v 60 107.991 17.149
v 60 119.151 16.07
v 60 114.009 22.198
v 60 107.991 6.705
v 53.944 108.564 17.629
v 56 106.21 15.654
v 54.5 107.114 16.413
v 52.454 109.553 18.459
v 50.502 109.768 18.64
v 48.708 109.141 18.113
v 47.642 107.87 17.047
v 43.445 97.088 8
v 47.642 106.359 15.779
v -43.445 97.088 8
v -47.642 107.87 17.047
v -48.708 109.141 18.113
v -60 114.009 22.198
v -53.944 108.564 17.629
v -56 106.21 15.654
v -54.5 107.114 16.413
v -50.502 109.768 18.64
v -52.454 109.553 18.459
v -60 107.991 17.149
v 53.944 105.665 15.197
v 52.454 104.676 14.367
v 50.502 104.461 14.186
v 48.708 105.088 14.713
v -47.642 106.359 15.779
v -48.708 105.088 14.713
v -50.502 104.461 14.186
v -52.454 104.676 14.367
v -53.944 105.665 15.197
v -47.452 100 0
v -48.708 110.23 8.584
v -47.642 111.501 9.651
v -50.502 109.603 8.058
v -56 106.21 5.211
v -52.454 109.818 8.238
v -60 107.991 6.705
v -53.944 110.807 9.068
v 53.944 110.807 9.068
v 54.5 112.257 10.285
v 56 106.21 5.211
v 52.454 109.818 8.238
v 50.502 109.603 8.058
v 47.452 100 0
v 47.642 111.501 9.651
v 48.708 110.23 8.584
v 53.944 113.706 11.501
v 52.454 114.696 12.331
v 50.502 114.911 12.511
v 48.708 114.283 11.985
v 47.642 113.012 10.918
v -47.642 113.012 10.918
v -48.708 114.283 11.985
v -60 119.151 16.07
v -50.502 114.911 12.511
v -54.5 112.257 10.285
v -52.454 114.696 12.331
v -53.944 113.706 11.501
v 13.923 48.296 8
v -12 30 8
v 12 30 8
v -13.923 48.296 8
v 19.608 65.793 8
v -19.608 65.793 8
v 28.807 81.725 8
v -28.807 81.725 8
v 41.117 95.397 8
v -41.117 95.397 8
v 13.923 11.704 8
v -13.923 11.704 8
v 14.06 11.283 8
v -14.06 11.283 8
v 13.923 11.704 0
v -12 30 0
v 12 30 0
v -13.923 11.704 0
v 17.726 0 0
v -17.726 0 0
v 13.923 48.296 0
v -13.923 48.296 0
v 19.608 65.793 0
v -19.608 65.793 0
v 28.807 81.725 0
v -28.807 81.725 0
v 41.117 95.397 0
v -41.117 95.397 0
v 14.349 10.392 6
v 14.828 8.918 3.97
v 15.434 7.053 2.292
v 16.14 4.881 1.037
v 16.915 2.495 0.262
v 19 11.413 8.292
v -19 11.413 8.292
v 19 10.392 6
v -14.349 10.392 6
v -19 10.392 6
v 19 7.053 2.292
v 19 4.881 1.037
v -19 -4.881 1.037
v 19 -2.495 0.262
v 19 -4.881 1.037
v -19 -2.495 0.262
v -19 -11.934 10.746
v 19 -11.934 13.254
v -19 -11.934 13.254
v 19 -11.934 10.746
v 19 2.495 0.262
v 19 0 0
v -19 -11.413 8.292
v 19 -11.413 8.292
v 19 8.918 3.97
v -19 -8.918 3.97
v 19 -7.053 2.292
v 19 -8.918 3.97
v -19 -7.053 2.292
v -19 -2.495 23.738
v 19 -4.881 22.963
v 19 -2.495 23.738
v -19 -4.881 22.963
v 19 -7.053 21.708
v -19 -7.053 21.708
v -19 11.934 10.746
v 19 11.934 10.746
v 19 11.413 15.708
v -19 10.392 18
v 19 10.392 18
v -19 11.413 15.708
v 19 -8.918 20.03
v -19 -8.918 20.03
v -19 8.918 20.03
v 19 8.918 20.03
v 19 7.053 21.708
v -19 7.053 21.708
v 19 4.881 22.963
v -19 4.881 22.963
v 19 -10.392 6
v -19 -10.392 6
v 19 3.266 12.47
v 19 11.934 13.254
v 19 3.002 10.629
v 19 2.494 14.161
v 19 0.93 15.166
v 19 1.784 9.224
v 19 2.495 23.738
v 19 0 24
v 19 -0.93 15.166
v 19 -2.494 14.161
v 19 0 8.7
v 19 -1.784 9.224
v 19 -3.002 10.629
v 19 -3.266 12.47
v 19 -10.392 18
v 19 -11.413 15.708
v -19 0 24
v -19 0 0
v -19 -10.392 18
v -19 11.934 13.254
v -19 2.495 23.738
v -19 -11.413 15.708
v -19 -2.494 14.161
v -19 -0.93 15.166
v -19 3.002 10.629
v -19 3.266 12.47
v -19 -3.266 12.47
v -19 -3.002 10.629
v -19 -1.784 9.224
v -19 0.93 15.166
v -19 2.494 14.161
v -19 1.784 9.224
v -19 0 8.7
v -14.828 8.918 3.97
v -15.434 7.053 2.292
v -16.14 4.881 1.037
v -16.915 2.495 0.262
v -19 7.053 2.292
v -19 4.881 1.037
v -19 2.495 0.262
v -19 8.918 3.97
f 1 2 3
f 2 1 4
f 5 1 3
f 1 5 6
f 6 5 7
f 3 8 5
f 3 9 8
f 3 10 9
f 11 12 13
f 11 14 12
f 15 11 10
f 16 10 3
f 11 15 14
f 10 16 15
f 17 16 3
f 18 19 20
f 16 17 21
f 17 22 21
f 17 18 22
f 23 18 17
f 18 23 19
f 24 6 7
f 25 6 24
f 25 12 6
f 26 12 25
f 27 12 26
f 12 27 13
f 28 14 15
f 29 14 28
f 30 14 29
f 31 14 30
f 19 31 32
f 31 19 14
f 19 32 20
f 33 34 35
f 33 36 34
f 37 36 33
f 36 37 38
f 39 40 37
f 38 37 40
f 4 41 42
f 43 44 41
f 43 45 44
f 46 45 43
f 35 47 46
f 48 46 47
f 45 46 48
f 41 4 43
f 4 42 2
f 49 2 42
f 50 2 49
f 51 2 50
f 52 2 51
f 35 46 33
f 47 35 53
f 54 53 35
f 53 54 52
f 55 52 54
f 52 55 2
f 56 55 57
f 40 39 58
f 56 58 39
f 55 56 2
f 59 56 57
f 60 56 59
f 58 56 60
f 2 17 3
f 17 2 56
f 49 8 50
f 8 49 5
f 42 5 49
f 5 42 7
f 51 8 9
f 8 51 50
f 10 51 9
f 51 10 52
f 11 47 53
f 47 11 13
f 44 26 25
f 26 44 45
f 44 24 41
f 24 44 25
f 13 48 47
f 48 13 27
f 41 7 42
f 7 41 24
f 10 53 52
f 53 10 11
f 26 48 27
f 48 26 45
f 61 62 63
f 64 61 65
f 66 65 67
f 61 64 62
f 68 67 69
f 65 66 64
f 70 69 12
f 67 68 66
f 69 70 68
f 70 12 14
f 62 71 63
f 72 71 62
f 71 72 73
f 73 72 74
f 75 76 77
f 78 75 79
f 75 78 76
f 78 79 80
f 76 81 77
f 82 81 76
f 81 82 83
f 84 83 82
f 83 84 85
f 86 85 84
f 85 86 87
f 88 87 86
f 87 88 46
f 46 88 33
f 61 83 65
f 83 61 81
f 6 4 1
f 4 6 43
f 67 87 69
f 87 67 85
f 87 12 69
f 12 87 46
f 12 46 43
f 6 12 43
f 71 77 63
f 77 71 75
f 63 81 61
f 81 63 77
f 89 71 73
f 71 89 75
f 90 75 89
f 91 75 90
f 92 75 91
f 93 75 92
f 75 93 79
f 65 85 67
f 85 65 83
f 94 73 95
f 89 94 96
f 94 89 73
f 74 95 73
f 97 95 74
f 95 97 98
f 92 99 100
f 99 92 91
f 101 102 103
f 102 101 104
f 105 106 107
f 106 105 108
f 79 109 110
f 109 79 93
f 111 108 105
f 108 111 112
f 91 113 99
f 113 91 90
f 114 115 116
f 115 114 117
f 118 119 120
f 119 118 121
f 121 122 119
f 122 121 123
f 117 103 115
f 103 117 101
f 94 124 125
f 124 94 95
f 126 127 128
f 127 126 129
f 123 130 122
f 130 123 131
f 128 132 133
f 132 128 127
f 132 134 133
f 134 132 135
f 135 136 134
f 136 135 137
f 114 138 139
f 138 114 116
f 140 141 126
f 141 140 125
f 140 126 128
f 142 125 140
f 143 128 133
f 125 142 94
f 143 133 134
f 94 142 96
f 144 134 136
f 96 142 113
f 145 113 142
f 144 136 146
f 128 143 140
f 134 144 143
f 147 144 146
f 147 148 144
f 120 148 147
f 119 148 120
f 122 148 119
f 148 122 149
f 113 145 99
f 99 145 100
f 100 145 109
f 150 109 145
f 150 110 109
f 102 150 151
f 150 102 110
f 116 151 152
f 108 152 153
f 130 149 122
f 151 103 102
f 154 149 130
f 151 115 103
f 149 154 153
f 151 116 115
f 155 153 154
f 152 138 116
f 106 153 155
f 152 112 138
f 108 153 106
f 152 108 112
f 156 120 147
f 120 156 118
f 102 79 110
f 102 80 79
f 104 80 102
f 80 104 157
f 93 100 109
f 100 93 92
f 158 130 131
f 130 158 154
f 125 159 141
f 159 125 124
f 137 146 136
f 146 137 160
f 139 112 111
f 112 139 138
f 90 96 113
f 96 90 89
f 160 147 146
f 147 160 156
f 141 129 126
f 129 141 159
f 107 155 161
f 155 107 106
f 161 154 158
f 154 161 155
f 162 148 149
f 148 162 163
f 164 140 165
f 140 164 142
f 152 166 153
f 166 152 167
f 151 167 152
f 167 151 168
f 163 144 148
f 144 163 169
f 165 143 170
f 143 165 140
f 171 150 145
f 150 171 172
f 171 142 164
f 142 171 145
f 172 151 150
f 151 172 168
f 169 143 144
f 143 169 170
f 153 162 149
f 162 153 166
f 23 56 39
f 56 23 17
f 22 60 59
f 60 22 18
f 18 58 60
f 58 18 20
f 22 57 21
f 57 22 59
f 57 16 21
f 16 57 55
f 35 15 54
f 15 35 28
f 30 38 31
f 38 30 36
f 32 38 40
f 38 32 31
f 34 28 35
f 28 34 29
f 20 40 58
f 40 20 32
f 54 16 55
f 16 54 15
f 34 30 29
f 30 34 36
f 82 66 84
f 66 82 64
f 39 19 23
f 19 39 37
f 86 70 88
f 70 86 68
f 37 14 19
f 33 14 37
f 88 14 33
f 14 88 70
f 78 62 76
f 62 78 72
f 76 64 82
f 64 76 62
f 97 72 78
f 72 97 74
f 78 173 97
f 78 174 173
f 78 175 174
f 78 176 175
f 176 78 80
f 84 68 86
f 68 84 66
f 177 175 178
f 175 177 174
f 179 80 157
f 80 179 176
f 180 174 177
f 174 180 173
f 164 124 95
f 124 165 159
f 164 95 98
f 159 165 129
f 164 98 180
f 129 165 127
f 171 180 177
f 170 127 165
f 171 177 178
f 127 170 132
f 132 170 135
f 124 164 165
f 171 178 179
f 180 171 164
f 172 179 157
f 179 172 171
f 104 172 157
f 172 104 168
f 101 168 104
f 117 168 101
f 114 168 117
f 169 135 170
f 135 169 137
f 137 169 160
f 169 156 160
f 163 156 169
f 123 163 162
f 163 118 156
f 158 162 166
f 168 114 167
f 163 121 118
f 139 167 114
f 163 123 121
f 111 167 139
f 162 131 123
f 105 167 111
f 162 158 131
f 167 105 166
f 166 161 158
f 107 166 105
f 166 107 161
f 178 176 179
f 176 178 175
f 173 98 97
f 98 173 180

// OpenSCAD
module haf(){
difference(){
union(){
cube([60,100,8 ]);
translate([0,100,0]) rotate([40,0,0]) difference(){
cube([60,25,8]);
translate([51,16,0]) cylinder(h=10,r=3.5);//bolt hole
}
}
translate([100,30,0]) cylinder(r=88,h=30);//cutaway
}//end diff



translate([0,0,12]) difference(){
rotate([0,90,0]) cylinder(h=19, r=12);//mounting cylinder
rotate([0,90,0]) cylinder(h=19, r=3.3);//bolt hole
}//end diff
}//end module

union(){
haf();
mirror([1,0,0]) haf();
}
